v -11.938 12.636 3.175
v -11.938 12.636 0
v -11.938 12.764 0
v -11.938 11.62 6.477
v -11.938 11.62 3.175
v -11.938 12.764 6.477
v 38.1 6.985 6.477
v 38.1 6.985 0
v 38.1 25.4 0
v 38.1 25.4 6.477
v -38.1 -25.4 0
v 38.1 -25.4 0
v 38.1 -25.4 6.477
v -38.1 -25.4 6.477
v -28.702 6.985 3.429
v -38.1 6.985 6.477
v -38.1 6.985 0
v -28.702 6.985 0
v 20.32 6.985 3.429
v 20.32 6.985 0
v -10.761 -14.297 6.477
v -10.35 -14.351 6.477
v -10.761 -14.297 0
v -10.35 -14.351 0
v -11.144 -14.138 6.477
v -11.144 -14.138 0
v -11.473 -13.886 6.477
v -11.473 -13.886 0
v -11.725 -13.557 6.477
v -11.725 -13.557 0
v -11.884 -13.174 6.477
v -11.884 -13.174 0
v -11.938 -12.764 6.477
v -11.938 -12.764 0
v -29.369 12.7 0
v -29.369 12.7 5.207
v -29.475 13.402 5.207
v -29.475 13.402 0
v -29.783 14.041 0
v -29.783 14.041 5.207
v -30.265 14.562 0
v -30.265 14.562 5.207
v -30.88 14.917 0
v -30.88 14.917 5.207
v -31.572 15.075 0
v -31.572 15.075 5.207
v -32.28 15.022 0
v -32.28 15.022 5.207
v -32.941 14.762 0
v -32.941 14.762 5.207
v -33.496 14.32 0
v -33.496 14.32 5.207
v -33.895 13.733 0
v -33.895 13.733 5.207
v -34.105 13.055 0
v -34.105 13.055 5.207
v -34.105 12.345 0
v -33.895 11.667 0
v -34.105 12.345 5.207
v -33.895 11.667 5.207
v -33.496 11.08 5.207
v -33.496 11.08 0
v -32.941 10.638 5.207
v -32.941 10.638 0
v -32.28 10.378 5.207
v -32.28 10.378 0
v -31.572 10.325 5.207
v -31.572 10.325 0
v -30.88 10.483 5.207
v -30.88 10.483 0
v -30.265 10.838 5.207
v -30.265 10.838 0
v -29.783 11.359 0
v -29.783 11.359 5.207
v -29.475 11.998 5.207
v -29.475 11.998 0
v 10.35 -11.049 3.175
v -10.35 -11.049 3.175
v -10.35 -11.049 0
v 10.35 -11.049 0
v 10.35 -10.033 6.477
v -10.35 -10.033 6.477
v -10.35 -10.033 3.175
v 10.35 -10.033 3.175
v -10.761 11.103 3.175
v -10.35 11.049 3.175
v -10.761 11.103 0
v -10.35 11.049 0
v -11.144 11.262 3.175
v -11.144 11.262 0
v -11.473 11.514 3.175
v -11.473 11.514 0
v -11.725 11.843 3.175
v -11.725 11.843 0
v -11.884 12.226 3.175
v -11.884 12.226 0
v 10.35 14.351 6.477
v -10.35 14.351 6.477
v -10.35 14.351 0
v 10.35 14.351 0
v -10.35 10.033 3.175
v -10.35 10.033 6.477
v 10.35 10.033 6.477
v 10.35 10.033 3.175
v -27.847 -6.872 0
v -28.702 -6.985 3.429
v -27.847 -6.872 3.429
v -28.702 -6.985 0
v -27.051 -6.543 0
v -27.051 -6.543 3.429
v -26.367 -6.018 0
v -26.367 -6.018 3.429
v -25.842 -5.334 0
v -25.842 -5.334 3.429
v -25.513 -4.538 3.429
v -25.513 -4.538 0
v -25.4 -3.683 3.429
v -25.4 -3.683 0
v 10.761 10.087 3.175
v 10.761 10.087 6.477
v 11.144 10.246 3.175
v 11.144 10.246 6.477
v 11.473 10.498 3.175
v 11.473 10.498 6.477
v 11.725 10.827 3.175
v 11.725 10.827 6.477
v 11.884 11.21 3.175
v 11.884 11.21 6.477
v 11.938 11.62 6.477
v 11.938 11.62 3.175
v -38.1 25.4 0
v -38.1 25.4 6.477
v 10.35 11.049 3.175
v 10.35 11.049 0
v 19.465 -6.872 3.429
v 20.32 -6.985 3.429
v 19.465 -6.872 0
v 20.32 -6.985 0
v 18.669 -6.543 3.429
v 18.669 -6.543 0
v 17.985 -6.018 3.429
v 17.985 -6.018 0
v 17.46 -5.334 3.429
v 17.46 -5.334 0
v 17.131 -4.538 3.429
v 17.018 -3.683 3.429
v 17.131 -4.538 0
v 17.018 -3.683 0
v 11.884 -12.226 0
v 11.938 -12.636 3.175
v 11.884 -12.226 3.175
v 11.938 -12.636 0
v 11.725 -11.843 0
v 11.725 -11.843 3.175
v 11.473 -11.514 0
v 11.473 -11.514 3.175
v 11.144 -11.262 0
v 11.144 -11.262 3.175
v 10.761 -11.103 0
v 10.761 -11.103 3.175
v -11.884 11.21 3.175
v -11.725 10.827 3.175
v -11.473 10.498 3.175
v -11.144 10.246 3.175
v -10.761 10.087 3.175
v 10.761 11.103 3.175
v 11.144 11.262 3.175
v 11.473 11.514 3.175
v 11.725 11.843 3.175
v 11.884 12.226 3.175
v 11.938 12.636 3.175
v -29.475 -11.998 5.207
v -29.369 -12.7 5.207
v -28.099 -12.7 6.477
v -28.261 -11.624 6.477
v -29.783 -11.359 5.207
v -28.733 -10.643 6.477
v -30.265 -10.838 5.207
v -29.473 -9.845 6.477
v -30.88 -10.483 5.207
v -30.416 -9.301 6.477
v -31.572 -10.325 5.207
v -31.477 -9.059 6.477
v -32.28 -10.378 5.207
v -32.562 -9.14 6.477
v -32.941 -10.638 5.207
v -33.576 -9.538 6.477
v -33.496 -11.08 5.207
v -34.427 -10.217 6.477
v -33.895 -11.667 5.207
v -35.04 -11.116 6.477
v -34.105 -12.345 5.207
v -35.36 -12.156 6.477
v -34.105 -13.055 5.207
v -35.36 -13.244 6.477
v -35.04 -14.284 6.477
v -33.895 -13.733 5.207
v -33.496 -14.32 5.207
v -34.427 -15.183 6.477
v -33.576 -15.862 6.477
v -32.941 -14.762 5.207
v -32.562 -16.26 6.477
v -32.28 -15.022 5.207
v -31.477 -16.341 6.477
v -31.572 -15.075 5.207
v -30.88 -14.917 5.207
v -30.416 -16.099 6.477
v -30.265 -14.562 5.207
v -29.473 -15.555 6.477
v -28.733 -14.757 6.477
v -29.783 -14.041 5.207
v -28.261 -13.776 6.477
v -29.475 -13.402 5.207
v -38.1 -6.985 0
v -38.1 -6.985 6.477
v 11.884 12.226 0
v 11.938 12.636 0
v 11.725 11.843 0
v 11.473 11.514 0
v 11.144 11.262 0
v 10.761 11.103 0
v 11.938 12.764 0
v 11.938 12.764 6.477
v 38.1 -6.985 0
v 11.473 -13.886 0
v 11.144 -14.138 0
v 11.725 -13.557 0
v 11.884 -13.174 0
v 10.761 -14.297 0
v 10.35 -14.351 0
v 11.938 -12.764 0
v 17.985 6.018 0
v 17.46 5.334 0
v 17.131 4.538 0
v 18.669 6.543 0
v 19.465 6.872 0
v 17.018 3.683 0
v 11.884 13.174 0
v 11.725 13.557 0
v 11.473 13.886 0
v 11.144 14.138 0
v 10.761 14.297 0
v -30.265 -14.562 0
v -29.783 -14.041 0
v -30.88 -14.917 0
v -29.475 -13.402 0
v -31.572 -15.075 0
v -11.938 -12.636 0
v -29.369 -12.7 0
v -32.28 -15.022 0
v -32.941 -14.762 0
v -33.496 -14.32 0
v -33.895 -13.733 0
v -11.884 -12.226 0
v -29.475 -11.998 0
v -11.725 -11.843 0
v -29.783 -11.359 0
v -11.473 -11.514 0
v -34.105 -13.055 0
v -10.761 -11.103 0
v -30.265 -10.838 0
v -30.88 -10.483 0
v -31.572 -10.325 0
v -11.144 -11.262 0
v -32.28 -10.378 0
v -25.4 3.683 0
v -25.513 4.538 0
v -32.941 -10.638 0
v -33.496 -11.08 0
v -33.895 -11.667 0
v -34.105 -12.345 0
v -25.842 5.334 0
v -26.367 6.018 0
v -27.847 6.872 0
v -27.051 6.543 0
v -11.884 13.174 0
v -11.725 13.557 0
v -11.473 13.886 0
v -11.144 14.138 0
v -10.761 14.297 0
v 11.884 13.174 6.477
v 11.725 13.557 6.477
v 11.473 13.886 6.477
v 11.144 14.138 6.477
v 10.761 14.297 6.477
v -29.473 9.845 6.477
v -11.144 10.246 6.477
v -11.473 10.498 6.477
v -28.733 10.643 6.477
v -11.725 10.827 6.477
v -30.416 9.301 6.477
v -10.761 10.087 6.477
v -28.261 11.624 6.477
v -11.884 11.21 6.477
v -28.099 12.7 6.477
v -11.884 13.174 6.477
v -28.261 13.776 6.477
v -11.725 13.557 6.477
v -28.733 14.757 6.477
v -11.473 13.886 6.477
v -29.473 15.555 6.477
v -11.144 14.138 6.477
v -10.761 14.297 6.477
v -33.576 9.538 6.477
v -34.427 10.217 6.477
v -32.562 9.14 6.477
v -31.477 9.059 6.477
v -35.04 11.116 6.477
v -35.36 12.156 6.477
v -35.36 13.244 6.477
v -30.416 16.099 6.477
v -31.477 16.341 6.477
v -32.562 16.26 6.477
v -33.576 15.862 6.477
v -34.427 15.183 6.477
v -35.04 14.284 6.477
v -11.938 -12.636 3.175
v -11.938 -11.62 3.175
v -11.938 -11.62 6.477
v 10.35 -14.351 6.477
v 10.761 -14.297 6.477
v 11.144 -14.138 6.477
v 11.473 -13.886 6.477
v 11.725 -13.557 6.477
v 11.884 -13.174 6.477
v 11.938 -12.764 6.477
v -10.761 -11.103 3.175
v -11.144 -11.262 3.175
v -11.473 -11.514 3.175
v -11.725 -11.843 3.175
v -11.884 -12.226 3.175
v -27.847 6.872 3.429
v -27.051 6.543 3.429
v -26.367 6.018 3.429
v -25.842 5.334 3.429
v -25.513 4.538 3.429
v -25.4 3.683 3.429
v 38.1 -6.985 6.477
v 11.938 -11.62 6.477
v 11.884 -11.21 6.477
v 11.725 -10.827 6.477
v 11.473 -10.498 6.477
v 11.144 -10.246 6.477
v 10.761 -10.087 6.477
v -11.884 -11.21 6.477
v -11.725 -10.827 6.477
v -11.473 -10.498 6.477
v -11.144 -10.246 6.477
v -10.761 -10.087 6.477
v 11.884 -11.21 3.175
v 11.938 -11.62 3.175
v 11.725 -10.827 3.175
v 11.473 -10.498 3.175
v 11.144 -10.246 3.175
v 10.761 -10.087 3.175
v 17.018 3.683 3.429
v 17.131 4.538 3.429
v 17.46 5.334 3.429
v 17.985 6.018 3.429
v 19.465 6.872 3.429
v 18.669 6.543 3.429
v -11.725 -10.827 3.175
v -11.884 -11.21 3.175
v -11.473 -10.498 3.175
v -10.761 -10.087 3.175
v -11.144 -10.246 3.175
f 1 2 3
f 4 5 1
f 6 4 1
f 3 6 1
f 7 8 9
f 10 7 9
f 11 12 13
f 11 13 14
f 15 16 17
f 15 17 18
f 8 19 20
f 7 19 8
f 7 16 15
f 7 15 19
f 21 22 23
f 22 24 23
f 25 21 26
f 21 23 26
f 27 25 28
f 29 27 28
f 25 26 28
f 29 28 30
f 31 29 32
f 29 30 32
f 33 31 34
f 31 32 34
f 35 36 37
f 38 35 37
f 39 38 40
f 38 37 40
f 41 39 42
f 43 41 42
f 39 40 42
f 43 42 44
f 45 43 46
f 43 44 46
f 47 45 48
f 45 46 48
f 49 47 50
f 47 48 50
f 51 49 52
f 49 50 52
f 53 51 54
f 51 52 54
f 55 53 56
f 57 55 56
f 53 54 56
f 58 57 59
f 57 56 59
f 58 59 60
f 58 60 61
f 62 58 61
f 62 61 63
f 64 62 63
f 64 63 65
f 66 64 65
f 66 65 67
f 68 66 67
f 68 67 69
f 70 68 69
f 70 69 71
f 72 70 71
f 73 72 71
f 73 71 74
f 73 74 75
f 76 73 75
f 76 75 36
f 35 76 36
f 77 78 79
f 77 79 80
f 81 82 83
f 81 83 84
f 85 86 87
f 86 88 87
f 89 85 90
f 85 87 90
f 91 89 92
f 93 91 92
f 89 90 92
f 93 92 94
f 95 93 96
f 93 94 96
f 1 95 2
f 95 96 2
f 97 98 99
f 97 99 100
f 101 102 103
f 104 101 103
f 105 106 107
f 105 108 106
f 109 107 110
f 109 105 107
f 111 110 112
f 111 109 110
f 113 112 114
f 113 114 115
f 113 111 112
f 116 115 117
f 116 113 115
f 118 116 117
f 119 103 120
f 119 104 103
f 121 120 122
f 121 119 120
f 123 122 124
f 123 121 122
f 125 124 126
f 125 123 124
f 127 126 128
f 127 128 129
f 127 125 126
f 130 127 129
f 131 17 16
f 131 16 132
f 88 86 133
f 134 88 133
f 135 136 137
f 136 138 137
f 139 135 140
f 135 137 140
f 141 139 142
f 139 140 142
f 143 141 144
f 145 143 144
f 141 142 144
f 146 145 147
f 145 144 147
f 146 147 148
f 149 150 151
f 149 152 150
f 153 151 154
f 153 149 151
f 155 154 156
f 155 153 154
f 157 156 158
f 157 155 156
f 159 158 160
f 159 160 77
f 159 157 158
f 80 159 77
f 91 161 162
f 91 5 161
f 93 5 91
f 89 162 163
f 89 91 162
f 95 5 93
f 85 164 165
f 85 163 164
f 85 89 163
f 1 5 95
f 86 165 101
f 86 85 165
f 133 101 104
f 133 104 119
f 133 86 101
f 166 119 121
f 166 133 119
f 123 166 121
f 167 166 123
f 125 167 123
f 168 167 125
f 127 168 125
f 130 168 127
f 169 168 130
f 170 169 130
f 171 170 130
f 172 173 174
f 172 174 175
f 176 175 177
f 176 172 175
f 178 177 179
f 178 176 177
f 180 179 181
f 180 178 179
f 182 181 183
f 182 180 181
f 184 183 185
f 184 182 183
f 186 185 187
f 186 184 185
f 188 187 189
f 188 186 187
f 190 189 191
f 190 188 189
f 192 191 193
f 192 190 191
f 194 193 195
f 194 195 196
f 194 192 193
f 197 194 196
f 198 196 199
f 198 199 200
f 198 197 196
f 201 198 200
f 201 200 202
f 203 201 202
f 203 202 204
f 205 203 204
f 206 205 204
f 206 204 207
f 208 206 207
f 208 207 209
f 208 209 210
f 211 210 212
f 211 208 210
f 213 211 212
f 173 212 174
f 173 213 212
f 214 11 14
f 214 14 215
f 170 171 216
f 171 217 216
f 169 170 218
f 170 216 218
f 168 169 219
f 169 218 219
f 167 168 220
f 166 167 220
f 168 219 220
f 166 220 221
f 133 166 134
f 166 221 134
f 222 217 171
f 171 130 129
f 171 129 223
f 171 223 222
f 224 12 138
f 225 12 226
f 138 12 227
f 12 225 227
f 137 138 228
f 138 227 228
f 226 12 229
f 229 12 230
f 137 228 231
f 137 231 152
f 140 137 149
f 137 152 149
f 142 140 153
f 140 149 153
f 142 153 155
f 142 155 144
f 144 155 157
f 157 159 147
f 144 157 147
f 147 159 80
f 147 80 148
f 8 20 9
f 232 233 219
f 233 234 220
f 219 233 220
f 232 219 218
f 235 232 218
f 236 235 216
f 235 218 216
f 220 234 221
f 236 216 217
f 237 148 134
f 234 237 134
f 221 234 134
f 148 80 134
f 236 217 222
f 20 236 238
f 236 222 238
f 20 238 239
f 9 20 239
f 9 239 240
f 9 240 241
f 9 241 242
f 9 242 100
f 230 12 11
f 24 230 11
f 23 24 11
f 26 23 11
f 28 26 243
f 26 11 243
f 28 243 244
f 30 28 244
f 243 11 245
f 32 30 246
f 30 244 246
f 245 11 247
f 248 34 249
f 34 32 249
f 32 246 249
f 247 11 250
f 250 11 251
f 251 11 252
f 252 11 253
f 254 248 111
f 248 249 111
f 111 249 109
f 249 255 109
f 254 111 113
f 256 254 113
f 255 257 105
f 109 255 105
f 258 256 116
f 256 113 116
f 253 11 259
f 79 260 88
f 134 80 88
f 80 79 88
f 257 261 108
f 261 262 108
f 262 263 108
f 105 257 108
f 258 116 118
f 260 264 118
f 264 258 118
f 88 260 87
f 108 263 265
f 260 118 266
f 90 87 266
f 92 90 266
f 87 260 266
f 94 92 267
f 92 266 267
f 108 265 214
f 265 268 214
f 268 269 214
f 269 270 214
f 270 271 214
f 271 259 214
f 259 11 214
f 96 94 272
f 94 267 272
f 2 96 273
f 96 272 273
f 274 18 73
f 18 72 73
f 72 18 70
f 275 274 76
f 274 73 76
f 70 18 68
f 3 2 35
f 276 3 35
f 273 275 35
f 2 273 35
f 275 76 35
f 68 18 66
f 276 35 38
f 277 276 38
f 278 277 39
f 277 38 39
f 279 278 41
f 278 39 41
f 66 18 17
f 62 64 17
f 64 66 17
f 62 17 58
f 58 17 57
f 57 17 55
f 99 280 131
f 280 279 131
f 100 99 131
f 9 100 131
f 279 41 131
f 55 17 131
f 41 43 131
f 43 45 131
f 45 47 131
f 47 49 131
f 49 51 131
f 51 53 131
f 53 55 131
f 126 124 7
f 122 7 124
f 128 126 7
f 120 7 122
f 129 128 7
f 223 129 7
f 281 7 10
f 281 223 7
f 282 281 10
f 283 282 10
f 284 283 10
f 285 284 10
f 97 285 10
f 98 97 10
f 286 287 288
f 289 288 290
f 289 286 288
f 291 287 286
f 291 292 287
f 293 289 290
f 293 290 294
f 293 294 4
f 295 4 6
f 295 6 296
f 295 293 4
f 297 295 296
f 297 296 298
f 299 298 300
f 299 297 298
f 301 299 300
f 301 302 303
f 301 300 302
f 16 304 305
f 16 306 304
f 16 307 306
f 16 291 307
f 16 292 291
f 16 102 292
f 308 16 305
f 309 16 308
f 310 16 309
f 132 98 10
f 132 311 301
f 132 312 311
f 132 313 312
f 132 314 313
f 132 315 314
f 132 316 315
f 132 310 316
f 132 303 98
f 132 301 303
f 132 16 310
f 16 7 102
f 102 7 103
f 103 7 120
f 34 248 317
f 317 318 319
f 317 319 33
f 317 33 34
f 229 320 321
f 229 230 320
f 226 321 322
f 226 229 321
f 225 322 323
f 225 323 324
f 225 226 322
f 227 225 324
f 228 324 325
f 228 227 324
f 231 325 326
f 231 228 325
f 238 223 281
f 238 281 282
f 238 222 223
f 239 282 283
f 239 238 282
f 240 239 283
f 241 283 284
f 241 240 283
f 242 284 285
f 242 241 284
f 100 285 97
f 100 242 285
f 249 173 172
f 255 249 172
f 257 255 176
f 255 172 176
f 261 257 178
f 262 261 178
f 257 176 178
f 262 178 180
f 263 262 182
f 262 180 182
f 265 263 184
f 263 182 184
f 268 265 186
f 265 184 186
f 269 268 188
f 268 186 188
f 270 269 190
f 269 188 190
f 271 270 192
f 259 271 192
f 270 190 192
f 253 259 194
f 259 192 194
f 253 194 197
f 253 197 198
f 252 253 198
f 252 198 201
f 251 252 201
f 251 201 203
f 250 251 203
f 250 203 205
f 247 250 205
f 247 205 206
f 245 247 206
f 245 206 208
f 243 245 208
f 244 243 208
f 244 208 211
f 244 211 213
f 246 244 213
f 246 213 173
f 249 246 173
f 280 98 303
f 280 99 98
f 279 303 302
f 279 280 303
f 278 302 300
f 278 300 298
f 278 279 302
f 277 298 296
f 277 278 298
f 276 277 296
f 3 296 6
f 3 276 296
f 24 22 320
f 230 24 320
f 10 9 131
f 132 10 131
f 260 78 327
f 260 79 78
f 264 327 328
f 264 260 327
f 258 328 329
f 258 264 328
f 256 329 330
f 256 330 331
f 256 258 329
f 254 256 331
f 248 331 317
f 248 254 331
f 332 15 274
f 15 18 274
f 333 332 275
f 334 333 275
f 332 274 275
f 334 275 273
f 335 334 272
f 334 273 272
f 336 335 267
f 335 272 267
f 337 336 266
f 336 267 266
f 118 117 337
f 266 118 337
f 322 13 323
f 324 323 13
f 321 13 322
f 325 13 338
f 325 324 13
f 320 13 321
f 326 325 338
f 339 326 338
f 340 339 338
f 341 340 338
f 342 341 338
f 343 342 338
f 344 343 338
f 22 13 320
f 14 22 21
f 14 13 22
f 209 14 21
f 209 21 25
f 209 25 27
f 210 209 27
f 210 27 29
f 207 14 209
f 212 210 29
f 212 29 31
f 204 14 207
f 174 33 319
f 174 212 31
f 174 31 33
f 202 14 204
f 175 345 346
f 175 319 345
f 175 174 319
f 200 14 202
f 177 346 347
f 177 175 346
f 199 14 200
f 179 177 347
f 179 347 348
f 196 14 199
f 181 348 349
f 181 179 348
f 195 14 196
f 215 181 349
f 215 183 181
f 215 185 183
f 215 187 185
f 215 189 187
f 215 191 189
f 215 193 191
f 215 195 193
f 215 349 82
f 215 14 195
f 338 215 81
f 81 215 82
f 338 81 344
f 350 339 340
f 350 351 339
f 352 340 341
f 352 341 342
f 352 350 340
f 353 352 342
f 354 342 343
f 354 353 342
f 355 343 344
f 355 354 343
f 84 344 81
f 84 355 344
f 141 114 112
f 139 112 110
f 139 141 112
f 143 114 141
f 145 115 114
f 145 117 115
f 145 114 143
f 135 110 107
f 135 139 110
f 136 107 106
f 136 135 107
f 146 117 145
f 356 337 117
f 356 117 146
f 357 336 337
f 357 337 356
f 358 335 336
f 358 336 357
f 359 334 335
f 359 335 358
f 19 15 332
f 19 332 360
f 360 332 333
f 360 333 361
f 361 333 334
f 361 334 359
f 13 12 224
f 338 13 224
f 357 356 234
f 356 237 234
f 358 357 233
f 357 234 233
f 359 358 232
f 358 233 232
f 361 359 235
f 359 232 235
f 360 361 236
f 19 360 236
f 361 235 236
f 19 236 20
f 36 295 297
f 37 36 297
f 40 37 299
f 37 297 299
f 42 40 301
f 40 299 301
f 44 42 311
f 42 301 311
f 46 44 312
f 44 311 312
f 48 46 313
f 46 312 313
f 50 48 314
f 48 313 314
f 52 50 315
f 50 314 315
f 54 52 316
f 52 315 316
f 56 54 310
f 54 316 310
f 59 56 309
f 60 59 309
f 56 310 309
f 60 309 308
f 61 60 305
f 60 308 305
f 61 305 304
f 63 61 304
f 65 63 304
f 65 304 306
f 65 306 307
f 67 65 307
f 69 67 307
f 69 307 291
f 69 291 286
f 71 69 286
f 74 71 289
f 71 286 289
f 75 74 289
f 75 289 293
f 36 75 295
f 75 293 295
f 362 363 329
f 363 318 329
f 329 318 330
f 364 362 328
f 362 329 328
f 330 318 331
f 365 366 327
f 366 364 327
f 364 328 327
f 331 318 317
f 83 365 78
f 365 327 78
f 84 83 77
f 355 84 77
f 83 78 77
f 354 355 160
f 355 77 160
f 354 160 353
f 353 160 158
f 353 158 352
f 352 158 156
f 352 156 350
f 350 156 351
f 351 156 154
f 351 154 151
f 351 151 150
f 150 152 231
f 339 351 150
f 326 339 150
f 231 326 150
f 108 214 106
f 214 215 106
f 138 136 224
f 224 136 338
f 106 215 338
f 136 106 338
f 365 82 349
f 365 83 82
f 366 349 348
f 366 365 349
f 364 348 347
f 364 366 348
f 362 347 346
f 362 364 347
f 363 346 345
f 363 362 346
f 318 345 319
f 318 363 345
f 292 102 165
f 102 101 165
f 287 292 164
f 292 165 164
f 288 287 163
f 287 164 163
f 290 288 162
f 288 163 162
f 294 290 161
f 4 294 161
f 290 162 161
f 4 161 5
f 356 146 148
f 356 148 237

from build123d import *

# Parameters (mm, degrees)
SKETCH1_W           = 50.8
SKETCH1_H           = 76.2
BOSS_EXTRUDE1_DEPTH = 6.477
SKETCH3_W           = 76.2
SKETCH3_H           = 13.97
CUT_EXTRUDE2_DEPTH  = 3.048
SKETCH2_R           = 2.38125
SKETCH2_W           = 12.7
SKETCH2_H           = 13.97
SKETCH2_W_2         = 21.082
CUT_EXTRUDE1_DEPTH  = 47.24631368
FILLET1_R           = 3.302
SKETCH5_W           = 23.876
SKETCH5_H           = 3.302
CUT_EXTRUDE3_DEPTH  = 47.24631368
SKETCH6_W           = 23.876
SKETCH6_H           = 1.016
CUT_EXTRUDE4_DEPTH  = 3.302
FILLET4_R           = 1.5875
FILLET5_R           = 1.5875
CHAMFER1_SIZE       = 1.27


with BuildPart() as part:
    # Sketch1 → Boss-Extrude1 (new body)
    with BuildSketch(Plane(origin=(0, 0, 0), x_dir=(0, 1, 0), z_dir=(0, 0, 1))):
        Rectangle(SKETCH1_W, SKETCH1_H)
    extrude(amount=BOSS_EXTRUDE1_DEPTH)

    # Sketch3 → Cut-Extrude2 (cut)
    with BuildSketch(Plane.XY.offset(6.477)):
        Rectangle(SKETCH3_W, SKETCH3_H)
    extrude(amount=-CUT_EXTRUDE2_DEPTH, mode=Mode.SUBTRACT)

    # Sketch2 → Cut-Extrude1 (cut, through all)
    with BuildSketch(Plane.XY.offset(6.477)):
        with Locations((-31.75, 12.7)):
            Circle(SKETCH2_R)
        with Locations((-31.75, -12.7)):
            Circle(SKETCH2_R)
        with Locations((-31.75, 0)):
            Rectangle(SKETCH2_W, SKETCH2_H)
        with Locations((27.559, 0)):
            Rectangle(SKETCH2_W_2, SKETCH2_H)
    extrude(amount=-CUT_EXTRUDE1_DEPTH, mode=Mode.SUBTRACT)

    # Fillet1
    fillet1_edges = [part.edges().sort_by_distance(p)[0] for p in [
        (-25.4, 6.985, 1.7145),
        (-25.4, -6.985, 1.7145),
        (17.018, 6.985, 1.7145),
        (17.018, -6.985, 1.7145),
    ]]
    fillet(fillet1_edges, radius=FILLET1_R)

    # Sketch5 → Cut-Extrude3 (cut, through all)
    with BuildSketch(Plane.XY.offset(6.477)):
        with Locations((0, 12.7)):
            Rectangle(SKETCH5_W, SKETCH5_H)
    cut_extrude3 = extrude(amount=-CUT_EXTRUDE3_DEPTH, mode=Mode.SUBTRACT)

    # Sketch6 → Cut-Extrude4 (cut)
    with BuildSketch(Plane.XY.offset(6.477)):
        with Locations((0, 10.541)):
            Rectangle(SKETCH6_W, SKETCH6_H)
    cut_extrude4 = extrude(amount=-CUT_EXTRUDE4_DEPTH, mode=Mode.SUBTRACT)

    # Mirror1: Cut-Extrude3, Cut-Extrude4 across plane
    add(cut_extrude3.mirror(Plane.ZX), mode=Mode.SUBTRACT)
    add(cut_extrude4.mirror(Plane.ZX), mode=Mode.SUBTRACT)

    # Fillet4
    fillet4_edges = [part.edges().sort_by_distance(p)[0] for p in [
        (11.938, 14.351, 3.2385),
        (11.938, 11.049, 1.5875),
        (-11.938, 11.049, 1.5875),
        (-11.938, 14.351, 3.2385),
        (11.938, -11.049, 1.5875),
        (11.938, -14.351, 3.2385),
        (-11.938, -14.351, 3.2385),
        (-11.938, -11.049, 1.5875),
    ]]
    fillet(fillet4_edges, radius=FILLET4_R)

    # Fillet5
    fillet5_edges = [part.edges().sort_by_distance(p)[0] for p in [
        (-11.938, 10.033, 4.826),
        (11.938, 10.033, 4.826),
        (-11.938, -10.033, 4.826),
        (11.938, -10.033, 4.826),
    ]]
    fillet(fillet5_edges, radius=FILLET5_R)

    # Chamfer1
    chamfer1_edges = [part.edges().sort_by_distance(p)[0] for p in [
        (-34.13125, 12.7, 6.477),
        (-34.13125, -12.7, 6.477),
    ]]
    chamfer(chamfer1_edges, length=CHAMFER1_SIZE)


solid = part.part
